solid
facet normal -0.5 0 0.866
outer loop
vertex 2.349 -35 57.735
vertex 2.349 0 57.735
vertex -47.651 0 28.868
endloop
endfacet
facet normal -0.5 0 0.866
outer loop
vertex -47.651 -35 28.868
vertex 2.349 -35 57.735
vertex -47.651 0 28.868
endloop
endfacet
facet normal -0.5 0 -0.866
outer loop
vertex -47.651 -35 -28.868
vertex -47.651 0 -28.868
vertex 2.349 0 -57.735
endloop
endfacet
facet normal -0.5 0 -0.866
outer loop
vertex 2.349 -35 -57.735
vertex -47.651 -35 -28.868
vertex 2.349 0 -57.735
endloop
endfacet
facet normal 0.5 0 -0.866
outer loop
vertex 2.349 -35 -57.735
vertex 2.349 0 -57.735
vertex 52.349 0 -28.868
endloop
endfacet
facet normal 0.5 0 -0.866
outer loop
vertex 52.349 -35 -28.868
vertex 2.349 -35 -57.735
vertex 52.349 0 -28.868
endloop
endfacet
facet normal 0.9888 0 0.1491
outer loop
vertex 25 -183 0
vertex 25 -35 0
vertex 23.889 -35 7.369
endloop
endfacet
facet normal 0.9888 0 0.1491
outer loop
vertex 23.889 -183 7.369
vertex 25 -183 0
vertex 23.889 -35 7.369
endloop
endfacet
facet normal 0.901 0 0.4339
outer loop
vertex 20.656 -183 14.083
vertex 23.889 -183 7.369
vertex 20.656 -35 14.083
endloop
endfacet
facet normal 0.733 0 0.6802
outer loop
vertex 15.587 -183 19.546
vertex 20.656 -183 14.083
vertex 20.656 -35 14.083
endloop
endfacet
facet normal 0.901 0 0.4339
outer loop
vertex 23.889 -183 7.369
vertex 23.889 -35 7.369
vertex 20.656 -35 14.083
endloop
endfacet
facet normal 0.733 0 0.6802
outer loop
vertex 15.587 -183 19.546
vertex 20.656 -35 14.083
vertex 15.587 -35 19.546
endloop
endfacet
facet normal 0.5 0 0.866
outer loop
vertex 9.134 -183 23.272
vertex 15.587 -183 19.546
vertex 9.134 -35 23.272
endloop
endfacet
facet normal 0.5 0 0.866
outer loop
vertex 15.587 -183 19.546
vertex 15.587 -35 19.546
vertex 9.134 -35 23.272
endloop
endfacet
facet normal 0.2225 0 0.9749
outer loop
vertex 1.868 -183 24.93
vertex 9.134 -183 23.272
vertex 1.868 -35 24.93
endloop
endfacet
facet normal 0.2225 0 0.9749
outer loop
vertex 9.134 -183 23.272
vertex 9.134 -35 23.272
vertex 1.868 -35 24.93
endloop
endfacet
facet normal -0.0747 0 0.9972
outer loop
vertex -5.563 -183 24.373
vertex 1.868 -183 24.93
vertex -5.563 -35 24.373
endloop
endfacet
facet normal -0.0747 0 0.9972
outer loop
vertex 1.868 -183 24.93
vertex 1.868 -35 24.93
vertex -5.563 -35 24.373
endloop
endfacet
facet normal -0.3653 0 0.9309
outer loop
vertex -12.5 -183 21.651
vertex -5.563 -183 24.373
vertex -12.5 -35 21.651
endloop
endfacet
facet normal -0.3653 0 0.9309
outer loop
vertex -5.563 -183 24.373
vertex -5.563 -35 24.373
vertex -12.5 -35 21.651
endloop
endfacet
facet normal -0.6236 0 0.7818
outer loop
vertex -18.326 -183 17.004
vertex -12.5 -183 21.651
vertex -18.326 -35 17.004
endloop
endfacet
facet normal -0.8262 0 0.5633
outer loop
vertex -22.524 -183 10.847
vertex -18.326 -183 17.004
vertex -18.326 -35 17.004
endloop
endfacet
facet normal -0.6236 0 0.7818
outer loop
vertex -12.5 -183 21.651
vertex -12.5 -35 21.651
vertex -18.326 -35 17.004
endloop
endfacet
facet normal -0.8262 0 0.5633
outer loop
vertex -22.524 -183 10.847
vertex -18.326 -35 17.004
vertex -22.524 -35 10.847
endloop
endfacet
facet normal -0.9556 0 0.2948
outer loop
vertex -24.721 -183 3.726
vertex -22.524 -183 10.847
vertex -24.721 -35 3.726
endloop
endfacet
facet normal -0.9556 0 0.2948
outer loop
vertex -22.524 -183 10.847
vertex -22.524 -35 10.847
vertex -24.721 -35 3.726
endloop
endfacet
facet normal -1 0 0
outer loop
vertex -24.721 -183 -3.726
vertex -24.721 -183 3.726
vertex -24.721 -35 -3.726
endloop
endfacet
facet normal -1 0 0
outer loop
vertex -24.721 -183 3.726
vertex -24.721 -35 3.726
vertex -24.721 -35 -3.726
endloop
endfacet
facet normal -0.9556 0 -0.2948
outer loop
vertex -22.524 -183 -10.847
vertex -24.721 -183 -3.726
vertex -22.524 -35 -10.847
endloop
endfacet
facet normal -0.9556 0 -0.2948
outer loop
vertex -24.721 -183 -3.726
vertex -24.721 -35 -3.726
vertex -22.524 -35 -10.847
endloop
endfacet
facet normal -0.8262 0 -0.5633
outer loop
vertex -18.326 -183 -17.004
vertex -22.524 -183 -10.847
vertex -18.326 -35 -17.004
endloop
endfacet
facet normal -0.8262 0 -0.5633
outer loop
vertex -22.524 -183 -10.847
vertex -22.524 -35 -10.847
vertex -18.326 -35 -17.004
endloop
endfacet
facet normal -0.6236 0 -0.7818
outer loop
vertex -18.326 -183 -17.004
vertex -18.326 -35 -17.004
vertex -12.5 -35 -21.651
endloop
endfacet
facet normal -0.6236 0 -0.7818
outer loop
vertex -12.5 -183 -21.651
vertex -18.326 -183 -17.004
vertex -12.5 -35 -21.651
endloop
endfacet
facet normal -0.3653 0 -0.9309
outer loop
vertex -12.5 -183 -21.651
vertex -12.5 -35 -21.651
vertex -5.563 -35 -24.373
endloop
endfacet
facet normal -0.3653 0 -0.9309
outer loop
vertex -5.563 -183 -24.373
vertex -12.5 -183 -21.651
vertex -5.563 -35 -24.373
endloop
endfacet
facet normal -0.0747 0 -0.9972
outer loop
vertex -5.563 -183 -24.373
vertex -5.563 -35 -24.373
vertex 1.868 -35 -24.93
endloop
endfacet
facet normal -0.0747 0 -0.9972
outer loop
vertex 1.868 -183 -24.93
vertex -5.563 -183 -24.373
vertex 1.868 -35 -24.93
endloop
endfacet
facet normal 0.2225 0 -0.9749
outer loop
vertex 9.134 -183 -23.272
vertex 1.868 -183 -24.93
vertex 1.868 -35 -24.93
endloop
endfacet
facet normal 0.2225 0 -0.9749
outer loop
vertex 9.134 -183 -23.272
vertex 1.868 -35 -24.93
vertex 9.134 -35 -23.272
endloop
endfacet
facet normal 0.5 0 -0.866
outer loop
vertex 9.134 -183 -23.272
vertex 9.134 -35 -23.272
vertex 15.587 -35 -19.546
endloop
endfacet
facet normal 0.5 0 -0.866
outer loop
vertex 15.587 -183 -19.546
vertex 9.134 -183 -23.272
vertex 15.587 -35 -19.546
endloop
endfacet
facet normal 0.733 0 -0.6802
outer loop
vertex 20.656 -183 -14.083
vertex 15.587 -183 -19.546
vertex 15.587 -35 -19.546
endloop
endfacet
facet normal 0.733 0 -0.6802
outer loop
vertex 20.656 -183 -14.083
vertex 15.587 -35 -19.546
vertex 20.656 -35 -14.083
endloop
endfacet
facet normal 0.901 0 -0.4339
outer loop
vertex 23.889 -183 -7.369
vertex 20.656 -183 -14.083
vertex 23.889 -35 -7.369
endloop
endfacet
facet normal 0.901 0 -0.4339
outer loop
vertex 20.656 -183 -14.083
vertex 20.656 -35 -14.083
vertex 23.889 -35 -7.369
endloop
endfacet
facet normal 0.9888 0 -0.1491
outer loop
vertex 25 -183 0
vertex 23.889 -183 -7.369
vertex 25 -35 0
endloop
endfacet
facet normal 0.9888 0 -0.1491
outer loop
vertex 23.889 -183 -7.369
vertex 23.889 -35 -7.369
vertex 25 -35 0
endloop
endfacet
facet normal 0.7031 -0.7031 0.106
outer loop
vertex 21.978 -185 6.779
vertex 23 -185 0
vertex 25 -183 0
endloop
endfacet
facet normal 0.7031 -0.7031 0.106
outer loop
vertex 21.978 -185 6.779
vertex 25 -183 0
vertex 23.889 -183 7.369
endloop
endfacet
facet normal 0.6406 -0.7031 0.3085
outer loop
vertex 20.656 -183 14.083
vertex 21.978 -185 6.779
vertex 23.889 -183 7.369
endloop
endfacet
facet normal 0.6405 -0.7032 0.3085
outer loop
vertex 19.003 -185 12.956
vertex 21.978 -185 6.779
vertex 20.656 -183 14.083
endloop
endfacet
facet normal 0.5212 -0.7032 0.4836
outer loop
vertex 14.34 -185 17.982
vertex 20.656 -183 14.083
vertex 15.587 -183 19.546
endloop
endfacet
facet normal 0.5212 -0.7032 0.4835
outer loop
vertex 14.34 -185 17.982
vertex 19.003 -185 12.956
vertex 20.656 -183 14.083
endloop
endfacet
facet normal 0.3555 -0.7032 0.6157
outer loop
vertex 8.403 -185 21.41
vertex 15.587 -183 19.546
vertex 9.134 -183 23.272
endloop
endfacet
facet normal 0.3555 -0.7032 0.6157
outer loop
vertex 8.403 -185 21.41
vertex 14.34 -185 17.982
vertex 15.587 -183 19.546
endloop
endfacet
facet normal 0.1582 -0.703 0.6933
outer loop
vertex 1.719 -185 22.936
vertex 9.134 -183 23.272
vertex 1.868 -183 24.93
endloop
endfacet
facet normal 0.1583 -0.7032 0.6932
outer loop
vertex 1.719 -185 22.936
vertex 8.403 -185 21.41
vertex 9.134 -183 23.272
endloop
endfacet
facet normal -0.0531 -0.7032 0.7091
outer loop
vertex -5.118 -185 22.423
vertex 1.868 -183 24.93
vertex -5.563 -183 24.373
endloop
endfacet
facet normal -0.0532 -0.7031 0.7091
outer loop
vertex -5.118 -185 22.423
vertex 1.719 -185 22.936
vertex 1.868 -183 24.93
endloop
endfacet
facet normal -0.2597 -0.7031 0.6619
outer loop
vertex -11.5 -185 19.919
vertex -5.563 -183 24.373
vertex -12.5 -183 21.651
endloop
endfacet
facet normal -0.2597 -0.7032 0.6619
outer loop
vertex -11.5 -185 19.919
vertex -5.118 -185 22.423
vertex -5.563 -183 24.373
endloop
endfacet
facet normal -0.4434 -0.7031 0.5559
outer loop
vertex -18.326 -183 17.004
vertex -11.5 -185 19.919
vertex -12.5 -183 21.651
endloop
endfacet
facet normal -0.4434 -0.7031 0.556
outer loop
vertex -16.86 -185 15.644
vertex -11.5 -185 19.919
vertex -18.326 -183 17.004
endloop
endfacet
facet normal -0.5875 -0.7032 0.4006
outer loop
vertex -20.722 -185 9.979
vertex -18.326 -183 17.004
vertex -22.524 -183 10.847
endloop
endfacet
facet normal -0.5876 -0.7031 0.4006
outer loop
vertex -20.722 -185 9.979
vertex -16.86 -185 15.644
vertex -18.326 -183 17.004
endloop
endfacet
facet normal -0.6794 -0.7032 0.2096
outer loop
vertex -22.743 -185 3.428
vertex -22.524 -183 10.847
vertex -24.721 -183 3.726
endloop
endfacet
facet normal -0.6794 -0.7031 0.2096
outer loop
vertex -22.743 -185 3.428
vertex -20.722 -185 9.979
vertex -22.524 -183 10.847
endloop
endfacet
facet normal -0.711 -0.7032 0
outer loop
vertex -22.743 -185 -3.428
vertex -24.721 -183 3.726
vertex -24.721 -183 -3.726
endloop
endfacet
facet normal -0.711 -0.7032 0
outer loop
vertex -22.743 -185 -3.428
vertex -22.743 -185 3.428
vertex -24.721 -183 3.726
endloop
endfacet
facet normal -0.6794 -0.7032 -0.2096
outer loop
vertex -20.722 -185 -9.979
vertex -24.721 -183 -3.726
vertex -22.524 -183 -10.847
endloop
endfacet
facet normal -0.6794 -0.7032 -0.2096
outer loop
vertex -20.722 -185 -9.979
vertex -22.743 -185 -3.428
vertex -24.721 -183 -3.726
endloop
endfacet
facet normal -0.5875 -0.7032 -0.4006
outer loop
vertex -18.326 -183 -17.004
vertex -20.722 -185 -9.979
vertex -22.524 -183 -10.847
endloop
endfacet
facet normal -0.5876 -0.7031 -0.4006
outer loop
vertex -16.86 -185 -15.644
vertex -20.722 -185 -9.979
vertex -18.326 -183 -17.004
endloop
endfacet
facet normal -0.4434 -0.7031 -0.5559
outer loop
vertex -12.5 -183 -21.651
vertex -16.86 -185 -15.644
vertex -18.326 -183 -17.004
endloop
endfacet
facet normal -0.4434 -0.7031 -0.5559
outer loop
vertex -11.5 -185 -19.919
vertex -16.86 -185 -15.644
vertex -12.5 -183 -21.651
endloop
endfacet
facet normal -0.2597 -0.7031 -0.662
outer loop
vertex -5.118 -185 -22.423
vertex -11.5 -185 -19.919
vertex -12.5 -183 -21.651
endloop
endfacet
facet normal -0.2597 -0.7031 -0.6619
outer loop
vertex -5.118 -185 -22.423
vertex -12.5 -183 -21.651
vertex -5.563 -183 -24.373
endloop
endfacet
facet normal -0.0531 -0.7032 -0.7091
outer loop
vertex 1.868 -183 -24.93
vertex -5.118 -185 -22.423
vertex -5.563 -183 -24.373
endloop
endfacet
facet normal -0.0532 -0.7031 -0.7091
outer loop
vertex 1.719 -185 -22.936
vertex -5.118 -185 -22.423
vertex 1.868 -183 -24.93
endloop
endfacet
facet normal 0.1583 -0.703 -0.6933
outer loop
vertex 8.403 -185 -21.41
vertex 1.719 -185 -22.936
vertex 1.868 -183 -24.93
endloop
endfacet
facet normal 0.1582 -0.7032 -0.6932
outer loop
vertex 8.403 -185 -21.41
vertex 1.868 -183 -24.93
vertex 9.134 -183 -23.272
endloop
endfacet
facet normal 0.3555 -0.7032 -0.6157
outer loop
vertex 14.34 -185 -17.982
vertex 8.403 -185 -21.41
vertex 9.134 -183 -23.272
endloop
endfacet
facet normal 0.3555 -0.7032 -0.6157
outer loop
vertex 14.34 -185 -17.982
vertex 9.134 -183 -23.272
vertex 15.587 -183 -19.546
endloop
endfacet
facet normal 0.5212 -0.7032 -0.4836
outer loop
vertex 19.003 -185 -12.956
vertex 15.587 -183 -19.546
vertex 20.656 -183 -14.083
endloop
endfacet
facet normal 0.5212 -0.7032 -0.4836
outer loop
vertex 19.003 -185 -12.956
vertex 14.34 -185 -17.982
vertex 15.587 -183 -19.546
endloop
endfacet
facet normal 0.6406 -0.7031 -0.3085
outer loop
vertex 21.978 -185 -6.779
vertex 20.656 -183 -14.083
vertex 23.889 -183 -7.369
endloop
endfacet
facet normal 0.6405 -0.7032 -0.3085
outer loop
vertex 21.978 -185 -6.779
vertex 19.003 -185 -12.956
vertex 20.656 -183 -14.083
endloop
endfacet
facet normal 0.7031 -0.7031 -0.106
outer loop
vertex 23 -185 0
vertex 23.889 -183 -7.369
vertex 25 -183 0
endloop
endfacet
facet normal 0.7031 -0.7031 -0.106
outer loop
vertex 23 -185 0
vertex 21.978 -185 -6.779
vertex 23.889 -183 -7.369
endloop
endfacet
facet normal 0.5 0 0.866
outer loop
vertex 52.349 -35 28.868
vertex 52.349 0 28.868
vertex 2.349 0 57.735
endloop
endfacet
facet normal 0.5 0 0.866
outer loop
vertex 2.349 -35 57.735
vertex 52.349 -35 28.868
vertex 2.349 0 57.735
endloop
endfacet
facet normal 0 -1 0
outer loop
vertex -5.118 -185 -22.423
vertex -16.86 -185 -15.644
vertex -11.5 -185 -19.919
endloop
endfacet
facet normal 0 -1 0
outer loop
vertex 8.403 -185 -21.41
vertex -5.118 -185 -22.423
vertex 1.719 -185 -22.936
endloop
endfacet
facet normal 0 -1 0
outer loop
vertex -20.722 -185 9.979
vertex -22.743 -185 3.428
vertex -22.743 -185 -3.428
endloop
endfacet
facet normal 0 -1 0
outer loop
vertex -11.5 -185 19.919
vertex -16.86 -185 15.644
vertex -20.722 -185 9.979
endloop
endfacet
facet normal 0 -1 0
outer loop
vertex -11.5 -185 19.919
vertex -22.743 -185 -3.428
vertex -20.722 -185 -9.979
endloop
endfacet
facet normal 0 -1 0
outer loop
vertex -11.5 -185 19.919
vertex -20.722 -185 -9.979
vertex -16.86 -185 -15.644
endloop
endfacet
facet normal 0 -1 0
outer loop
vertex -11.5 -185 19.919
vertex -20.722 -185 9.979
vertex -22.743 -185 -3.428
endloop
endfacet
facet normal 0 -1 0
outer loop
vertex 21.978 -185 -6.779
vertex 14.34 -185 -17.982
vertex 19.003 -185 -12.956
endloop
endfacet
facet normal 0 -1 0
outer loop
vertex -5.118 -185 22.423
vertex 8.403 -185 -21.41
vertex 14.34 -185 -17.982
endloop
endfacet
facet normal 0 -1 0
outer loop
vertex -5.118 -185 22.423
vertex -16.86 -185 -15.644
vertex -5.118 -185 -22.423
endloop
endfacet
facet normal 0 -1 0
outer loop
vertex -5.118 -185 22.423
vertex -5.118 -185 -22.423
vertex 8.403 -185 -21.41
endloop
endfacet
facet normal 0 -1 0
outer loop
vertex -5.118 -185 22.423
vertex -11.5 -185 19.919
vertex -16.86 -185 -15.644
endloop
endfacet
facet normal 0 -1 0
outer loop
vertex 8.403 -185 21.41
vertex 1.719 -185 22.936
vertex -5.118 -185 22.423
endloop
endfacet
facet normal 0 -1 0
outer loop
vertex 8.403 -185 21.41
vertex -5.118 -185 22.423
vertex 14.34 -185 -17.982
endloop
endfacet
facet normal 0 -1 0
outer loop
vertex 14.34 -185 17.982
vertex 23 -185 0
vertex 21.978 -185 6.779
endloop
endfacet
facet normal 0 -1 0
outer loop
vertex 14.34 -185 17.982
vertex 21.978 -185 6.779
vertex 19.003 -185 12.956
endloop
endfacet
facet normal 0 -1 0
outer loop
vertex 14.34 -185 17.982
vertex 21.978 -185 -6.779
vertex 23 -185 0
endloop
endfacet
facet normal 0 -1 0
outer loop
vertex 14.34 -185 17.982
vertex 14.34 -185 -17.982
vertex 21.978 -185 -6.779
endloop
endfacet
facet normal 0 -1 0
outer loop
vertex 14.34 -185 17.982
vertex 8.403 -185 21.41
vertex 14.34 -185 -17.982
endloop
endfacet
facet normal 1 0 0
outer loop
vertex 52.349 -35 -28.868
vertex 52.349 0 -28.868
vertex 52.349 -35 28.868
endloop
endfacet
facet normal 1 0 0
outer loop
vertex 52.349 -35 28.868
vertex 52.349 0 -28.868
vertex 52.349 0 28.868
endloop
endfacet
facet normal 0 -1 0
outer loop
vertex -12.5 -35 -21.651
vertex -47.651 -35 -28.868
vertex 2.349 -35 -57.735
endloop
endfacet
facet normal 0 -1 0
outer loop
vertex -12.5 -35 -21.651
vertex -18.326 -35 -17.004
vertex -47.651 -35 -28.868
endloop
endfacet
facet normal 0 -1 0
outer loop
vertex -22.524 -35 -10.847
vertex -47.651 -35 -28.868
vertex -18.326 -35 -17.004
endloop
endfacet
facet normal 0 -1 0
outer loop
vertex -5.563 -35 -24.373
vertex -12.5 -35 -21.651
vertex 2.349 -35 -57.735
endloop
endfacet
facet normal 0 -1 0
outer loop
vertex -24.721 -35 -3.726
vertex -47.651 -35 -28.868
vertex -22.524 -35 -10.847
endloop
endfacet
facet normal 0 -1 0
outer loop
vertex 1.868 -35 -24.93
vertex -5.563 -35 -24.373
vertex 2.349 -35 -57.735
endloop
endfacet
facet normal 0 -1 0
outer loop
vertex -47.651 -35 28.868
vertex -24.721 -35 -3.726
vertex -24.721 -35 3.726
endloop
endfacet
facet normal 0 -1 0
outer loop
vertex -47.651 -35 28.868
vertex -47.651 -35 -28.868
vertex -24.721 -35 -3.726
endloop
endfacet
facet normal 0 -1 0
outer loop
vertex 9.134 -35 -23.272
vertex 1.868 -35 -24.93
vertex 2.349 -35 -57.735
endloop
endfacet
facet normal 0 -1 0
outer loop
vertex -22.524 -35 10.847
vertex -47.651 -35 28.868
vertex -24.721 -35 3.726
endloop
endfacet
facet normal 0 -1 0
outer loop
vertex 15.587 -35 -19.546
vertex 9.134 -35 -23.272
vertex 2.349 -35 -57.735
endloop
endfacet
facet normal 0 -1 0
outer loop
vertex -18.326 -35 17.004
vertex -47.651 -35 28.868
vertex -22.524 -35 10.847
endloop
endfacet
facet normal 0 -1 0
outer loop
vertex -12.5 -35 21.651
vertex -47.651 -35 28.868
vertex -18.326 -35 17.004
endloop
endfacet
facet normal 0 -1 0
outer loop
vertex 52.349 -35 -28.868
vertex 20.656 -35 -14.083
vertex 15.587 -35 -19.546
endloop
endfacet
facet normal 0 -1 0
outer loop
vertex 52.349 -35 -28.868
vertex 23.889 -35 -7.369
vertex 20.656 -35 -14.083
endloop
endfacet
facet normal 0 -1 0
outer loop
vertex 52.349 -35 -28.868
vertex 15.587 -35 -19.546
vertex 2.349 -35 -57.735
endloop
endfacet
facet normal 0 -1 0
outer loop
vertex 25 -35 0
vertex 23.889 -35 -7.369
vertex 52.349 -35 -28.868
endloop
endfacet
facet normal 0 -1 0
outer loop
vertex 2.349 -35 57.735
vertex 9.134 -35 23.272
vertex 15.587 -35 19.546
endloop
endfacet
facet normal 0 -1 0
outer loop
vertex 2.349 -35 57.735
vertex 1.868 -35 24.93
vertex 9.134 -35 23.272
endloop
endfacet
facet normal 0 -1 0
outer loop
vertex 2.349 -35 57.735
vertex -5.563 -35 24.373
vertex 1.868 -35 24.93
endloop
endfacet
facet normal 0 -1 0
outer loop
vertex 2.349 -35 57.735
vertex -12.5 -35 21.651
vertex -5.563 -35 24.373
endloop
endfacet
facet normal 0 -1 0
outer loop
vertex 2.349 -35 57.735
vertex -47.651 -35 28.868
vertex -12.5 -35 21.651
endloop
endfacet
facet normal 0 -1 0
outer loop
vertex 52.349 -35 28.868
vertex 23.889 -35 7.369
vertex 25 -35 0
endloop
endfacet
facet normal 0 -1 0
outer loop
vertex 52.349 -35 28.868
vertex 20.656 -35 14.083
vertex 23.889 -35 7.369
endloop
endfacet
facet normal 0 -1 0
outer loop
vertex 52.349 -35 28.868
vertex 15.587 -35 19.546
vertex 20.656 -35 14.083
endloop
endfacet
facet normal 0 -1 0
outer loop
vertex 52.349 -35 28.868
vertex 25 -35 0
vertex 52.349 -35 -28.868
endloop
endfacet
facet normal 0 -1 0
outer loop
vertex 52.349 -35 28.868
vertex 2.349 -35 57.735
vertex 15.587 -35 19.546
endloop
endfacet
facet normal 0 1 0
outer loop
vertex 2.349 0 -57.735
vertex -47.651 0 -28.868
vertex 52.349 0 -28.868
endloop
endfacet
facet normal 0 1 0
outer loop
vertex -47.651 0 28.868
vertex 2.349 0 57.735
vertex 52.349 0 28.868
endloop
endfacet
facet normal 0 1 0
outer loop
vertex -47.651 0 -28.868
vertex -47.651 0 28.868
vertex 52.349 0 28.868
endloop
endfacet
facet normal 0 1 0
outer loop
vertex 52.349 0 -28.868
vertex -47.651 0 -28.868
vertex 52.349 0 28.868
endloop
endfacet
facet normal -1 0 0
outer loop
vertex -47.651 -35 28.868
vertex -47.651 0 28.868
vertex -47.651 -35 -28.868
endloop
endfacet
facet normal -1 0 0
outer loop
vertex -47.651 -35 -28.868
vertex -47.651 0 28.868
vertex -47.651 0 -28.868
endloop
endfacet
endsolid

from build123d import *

# Parameters (mm, degrees)
F1_DEPTH = 35
F2_R     = 25
F3_DEPTH = 150
F4_SIZE  = 2


with BuildPart() as f1:
    # F0 (on Front) → F1 (new body)
    with BuildSketch(Plane.XZ):
        Polygon((52.348992, -28.867513), (52.348992, 28.867513), (2.348992, 57.735027), (-47.651008, 28.867513), (-47.651008, -28.867513), (2.348992, -57.735027), align=None)
    extrude(amount=F1_DEPTH)

    # F2 (on face) → F3 (join)
    with BuildSketch(Plane.XZ.offset(35)):
        Circle(F2_R)
    extrude(amount=F3_DEPTH)

    # F4
    f4_edges = [f1.edges().sort_by_distance(p)[0] for p in [
        (-25, -185, 0),
    ]]
    chamfer(f4_edges, length=F4_SIZE)


solid = f1.part
